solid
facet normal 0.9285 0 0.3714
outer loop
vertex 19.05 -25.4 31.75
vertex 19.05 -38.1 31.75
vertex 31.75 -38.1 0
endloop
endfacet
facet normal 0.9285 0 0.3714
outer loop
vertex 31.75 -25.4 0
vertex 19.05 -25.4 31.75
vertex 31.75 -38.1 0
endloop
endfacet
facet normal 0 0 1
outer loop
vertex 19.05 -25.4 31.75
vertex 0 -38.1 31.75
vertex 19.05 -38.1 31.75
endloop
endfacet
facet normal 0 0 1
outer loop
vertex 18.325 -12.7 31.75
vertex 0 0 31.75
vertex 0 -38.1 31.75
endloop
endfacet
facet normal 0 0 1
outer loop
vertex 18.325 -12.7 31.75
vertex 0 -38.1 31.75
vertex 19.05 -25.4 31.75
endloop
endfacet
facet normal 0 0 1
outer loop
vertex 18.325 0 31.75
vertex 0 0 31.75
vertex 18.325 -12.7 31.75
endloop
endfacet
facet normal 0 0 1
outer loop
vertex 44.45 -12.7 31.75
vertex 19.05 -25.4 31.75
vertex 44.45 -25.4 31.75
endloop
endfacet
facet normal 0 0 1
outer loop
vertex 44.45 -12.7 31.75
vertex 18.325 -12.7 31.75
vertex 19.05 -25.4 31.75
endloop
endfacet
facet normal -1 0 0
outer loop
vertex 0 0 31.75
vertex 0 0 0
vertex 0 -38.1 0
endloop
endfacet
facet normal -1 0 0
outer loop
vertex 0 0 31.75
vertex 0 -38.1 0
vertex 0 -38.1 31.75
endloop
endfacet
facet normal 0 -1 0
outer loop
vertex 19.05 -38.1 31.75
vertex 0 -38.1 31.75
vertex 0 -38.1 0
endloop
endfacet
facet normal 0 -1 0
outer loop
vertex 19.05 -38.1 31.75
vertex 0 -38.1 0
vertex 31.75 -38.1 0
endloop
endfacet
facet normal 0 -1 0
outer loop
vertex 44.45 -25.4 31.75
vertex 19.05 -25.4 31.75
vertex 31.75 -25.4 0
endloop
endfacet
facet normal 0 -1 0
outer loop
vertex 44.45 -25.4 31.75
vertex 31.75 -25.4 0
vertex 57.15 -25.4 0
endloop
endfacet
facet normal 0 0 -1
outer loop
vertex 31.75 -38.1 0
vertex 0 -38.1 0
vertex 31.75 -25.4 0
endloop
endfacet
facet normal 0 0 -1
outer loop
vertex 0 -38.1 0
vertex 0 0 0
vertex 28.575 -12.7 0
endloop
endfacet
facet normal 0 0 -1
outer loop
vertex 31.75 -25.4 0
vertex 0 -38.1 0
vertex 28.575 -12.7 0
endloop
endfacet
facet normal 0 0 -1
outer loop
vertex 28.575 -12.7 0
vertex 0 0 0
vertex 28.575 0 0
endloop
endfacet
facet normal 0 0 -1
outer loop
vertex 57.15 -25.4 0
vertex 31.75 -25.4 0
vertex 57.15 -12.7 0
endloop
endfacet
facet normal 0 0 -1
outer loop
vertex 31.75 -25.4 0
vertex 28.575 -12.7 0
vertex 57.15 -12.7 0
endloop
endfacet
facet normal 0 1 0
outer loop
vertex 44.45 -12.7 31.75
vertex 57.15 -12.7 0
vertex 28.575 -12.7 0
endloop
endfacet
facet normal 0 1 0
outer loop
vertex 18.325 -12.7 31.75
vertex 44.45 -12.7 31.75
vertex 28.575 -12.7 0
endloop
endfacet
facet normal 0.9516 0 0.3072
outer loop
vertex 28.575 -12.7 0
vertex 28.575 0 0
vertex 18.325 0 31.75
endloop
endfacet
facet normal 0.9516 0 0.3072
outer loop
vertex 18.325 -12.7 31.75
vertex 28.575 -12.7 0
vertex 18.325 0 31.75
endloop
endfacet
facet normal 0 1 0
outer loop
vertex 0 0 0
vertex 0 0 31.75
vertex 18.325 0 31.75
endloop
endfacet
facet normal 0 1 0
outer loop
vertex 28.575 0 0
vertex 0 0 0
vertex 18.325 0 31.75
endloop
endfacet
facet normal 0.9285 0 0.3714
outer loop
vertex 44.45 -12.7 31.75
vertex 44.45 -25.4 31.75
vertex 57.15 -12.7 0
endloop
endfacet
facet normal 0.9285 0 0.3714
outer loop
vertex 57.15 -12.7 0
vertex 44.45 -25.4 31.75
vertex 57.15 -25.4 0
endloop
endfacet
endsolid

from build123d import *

# Parameters (mm, degrees)
F0_W     = 57.15
F0_H     = 31.75
F1_DEPTH = 38.1
F3_DEPTH = 12.7
F5_DEPTH = 25.4
F7_DEPTH = 12.7


with BuildPart() as f1:
    # F0 (on Front) → F1 (new body)
    with BuildSketch(Plane.XZ):
        with Locations((28.575, 15.875)):
            Rectangle(F0_W, F0_H)
    extrude(amount=F1_DEPTH)

    # F2 (on face) → F3 (cut)
    with BuildSketch(Plane.XZ.offset(38.1)):
        Polygon((57.15, 31.75), (19.05, 31.75), (31.75, 0), (57.15, 0), align=None)
    extrude(amount=-F3_DEPTH, mode=Mode.SUBTRACT)

    # F4 (on face) → F5 (cut)
    with BuildSketch(Plane.XZ.offset(25.4)):
        Polygon((57.15, 31.75), (44.45, 31.75), (57.15, 0), align=None)
    extrude(amount=-F5_DEPTH, mode=Mode.SUBTRACT)

    # F6 (on face) → F7 (cut)
    with BuildSketch(Plane(origin=(0, 0, 0), x_dir=(-1, 0, 0), z_dir=(0, 1, 0))):
        Polygon((-28.575, 0), (-18.325109, 31.75), (-44.45, 31.75), (-57.15, 0), align=None)
    extrude(amount=-F7_DEPTH, mode=Mode.SUBTRACT)


solid = f1.part
